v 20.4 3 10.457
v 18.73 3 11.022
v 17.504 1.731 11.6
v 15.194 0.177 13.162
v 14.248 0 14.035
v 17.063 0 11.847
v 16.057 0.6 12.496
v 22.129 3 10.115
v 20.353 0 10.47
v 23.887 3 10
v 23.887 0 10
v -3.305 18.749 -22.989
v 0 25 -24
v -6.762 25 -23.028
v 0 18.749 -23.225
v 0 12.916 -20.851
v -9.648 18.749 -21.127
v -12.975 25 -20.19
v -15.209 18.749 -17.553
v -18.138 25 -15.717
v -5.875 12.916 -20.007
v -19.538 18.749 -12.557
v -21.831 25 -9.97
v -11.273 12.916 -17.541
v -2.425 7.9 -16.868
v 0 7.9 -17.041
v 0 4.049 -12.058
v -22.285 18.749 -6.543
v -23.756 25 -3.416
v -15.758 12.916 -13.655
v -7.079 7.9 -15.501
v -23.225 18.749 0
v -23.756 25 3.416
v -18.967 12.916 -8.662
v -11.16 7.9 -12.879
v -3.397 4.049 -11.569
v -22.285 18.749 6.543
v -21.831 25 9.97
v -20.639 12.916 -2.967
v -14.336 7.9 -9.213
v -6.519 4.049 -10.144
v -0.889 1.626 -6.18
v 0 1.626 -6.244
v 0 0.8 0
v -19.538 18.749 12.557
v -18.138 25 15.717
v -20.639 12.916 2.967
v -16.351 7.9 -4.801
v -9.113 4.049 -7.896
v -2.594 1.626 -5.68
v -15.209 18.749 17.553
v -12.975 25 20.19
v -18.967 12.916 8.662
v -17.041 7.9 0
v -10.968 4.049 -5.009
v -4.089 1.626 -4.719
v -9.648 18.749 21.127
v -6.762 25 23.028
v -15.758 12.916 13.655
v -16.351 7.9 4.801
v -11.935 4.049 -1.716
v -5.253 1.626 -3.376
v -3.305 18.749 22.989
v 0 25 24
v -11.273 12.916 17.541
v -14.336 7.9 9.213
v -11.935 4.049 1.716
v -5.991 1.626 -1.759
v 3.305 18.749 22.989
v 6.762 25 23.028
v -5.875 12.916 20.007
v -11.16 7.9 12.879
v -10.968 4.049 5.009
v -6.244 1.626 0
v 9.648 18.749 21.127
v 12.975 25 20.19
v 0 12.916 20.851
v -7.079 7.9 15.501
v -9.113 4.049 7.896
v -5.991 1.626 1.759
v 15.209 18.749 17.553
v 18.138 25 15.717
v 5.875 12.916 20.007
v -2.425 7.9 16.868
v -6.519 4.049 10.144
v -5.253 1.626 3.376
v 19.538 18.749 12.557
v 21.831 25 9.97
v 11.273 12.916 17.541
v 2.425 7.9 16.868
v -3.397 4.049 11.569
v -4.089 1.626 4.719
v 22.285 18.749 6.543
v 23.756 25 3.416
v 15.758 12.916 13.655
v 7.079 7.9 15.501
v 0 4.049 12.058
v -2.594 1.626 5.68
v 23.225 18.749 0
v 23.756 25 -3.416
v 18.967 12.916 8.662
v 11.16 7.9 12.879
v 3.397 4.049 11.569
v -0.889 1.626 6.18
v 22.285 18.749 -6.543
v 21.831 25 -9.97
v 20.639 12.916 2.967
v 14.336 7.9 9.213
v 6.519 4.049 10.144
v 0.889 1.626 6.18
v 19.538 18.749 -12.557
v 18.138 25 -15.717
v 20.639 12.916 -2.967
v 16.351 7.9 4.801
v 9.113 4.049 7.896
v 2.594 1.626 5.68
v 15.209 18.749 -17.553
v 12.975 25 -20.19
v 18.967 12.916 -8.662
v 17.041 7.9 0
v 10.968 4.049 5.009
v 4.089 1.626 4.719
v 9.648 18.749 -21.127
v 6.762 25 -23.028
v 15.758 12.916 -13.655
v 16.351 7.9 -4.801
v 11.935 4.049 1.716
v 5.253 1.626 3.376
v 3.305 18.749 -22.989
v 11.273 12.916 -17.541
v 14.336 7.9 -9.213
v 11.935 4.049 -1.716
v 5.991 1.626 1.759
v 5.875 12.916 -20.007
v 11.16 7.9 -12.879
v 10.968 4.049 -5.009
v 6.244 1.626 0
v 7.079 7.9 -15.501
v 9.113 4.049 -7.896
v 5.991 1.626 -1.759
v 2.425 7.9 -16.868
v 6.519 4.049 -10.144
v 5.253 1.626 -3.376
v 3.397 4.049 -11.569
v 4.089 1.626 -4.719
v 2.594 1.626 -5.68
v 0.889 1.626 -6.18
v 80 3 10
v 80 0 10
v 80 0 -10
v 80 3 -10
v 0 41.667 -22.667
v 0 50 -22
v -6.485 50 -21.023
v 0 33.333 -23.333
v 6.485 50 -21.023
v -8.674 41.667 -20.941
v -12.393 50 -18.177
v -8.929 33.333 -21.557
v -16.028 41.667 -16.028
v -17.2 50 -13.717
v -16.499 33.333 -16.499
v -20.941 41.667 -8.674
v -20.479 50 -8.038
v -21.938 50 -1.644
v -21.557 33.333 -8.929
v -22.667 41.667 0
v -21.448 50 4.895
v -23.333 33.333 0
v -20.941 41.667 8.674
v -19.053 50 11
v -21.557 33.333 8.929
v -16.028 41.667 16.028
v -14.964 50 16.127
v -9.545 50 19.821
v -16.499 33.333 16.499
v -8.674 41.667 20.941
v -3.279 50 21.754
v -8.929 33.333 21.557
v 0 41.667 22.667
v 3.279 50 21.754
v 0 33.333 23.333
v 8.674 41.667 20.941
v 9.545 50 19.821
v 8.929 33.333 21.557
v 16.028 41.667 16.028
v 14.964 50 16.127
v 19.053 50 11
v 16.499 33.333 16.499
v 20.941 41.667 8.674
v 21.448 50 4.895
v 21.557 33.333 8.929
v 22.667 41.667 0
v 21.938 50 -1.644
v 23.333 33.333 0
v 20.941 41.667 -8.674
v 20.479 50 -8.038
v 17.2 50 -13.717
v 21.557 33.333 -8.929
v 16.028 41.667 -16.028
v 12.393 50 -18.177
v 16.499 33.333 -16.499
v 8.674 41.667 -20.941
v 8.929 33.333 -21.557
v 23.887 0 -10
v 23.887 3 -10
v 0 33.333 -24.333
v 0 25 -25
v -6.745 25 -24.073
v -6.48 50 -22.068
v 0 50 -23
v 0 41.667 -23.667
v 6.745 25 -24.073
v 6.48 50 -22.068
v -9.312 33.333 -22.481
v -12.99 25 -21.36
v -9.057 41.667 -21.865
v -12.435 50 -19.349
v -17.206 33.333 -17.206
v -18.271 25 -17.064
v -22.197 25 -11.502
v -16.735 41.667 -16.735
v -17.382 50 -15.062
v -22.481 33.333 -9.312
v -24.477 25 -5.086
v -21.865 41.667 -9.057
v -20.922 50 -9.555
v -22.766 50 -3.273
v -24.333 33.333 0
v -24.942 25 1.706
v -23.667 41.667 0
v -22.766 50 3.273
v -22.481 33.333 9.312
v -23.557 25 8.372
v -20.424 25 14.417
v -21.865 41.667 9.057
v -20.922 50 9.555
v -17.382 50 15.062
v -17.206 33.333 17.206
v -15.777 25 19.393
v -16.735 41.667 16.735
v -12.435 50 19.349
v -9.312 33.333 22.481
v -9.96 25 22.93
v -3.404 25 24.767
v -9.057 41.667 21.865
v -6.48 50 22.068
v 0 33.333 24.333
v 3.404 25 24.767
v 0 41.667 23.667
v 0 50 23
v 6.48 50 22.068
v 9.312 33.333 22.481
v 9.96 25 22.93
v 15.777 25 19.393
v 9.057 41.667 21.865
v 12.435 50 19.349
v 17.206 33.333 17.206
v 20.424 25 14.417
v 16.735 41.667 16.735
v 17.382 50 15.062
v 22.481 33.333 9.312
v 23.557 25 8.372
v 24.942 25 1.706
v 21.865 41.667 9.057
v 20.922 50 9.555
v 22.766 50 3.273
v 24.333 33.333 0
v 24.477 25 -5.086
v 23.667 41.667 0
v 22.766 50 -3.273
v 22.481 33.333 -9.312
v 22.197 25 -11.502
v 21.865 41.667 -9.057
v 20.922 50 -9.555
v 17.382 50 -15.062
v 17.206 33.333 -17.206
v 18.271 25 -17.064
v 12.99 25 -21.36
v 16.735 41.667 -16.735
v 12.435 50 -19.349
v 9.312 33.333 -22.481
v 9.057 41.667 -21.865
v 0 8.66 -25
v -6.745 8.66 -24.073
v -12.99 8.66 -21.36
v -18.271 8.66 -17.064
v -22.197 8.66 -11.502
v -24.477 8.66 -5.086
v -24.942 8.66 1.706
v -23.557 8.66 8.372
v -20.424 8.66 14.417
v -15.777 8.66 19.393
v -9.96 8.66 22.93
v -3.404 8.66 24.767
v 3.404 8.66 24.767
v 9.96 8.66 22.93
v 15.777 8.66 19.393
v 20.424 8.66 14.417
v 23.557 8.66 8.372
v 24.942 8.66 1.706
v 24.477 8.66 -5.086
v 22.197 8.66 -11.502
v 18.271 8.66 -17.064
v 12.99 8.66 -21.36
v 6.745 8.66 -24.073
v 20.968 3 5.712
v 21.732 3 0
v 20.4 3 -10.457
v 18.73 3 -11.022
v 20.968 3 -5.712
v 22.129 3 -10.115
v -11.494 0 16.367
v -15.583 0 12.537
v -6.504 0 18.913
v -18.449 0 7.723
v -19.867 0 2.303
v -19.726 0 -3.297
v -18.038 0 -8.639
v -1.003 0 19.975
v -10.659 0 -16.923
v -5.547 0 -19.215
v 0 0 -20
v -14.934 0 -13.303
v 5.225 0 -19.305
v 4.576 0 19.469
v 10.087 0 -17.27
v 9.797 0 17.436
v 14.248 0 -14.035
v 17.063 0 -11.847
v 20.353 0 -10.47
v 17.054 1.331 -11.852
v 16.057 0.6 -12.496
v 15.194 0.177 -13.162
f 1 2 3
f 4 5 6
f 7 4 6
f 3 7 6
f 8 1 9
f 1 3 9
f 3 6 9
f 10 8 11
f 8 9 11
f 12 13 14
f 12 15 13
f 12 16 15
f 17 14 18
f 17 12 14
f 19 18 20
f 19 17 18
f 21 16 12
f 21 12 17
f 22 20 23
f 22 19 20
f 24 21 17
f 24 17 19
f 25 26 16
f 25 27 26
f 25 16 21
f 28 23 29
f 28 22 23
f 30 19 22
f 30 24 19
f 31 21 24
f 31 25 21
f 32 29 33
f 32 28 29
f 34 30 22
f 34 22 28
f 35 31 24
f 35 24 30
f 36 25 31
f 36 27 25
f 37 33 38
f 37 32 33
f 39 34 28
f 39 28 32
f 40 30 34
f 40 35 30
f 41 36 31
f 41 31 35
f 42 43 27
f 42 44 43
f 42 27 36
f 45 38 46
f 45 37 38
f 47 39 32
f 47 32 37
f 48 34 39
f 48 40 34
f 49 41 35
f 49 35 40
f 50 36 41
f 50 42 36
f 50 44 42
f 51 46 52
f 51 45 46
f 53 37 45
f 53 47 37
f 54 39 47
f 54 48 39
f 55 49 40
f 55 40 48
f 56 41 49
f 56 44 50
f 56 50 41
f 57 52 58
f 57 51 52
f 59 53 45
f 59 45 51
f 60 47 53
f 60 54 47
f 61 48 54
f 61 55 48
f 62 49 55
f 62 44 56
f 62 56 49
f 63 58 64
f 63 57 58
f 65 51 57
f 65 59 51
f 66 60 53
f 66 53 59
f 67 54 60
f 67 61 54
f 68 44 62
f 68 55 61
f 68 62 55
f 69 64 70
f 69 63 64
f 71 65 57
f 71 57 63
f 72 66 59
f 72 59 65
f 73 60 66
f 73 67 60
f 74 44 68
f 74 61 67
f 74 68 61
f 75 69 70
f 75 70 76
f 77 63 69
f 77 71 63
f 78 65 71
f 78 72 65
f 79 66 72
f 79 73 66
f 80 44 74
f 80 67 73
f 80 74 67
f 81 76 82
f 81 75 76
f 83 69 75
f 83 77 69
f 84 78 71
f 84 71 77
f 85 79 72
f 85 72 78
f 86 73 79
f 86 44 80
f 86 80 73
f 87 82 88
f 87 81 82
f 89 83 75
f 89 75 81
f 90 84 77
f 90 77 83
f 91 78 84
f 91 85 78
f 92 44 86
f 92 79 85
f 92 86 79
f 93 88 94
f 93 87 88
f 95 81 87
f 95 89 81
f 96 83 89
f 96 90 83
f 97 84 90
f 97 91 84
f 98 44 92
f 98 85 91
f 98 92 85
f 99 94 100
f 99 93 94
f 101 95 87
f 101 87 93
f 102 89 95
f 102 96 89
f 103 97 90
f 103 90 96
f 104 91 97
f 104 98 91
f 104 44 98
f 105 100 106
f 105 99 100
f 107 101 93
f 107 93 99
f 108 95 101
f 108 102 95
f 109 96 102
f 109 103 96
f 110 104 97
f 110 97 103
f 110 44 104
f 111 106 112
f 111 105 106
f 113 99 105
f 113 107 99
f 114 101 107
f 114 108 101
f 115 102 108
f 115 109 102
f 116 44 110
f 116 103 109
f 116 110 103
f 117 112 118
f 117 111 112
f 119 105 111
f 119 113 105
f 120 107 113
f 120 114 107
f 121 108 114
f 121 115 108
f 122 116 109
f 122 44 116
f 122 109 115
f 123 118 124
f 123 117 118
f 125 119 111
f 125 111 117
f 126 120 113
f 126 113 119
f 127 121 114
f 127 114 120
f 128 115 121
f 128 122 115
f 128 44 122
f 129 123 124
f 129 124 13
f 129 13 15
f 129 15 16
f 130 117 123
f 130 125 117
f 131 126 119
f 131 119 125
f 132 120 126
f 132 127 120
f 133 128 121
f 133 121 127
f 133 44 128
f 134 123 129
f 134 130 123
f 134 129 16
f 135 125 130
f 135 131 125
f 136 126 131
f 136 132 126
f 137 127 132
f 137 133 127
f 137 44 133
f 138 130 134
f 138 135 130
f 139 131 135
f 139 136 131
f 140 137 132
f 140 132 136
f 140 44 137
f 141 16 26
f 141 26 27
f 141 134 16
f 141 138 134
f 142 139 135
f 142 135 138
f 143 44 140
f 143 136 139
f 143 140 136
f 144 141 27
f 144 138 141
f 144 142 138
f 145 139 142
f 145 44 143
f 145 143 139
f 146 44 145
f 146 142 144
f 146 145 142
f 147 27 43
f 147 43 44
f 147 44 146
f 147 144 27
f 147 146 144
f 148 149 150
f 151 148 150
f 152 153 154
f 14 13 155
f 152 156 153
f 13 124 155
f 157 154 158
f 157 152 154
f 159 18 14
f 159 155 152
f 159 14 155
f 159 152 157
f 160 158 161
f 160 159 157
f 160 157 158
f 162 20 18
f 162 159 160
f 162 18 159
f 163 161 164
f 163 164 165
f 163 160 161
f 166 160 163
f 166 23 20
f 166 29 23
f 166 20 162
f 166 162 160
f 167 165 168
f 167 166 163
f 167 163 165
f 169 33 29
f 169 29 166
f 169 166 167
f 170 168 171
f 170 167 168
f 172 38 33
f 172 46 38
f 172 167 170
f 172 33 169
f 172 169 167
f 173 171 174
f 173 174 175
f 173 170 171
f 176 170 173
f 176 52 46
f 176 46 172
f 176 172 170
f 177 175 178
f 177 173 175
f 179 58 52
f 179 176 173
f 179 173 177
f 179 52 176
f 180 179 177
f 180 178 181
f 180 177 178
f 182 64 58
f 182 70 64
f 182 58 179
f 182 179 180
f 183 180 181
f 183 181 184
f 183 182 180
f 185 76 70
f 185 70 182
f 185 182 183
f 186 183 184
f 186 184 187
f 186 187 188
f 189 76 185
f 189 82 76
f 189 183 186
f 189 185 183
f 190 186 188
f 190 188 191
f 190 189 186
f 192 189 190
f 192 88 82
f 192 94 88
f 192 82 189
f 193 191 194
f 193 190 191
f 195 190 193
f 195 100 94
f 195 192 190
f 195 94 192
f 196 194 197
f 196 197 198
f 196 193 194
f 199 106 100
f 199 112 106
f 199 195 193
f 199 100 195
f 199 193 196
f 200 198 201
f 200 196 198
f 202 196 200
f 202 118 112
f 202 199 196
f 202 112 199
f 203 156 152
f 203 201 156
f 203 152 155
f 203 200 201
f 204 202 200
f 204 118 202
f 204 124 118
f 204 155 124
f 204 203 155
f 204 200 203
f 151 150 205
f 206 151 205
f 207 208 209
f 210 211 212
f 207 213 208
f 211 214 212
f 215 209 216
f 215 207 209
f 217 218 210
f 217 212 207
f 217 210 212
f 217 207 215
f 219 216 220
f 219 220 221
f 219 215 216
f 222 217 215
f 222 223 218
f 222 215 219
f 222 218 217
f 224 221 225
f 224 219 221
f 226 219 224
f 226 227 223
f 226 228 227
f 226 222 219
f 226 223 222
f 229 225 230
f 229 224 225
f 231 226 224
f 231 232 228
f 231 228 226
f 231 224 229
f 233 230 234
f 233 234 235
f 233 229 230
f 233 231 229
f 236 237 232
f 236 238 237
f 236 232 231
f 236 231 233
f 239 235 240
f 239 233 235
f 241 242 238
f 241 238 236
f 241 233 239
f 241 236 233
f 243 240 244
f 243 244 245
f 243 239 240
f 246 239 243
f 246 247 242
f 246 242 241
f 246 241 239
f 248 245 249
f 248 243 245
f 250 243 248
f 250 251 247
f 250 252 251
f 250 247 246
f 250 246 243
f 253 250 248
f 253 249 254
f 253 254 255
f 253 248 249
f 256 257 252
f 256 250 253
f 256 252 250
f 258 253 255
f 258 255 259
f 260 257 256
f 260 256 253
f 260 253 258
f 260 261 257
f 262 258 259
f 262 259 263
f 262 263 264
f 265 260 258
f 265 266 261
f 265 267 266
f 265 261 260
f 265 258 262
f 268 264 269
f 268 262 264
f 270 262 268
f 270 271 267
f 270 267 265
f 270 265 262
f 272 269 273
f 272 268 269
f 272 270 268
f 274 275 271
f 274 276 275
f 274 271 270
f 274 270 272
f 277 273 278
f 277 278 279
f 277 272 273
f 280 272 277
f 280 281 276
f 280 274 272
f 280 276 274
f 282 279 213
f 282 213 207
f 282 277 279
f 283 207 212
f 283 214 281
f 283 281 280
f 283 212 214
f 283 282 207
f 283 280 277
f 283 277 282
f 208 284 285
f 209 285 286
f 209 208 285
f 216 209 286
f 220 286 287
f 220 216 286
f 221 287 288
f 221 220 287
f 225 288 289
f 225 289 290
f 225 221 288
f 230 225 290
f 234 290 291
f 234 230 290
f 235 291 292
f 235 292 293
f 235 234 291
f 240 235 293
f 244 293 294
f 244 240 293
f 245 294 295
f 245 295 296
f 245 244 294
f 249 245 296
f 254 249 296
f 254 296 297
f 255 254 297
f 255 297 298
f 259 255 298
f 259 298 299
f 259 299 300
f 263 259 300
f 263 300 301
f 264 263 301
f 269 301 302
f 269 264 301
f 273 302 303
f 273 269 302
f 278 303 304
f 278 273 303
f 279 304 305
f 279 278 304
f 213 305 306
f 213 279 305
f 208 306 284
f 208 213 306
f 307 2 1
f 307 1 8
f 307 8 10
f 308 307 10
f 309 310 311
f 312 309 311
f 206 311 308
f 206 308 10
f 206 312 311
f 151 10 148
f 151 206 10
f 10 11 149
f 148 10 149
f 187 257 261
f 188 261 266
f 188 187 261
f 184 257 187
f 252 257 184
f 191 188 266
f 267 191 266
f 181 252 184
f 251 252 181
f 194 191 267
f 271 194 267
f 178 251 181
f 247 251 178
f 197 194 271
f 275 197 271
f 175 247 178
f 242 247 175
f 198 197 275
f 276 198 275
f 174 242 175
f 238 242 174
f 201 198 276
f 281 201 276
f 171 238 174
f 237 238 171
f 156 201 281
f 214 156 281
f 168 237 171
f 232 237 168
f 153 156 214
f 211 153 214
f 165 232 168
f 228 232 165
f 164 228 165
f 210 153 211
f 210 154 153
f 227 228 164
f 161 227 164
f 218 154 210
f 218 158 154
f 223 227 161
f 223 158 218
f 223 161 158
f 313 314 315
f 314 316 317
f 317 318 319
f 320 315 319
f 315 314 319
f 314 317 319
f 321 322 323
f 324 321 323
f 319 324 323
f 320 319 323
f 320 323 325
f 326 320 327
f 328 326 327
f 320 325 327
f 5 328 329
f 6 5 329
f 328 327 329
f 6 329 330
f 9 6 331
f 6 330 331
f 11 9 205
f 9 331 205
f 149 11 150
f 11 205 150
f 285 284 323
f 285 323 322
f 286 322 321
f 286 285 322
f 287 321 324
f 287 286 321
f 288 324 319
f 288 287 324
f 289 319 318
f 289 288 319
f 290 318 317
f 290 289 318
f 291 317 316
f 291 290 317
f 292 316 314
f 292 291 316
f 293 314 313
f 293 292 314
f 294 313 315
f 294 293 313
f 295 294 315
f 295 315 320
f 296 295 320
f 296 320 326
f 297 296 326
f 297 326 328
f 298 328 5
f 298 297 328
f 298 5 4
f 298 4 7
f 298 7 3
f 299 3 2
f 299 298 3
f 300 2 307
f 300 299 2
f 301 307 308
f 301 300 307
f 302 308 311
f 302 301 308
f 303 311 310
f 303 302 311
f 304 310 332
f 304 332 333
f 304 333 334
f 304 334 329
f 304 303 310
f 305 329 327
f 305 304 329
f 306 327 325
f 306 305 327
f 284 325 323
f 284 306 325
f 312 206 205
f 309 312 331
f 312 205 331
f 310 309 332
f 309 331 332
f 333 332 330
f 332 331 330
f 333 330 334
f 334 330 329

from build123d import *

# Parameters (mm, degrees)
BOSS_EXTRUDE2_DEPTH = 3


with BuildPart() as part:
    # Sketch6 → Revolve1 (revolve)
    with BuildSketch(Plane(origin=(0, 0, 0), x_dir=(0, 0, -1), z_dir=(1, 0, 0)), mode=Mode.PRIVATE) as revolve1_sk:
        with BuildLine():
            Line((0, 0), (-20, 0))
            Line((-20, 0), (-25, 8.660254038))
            Line((-25, 8.660254038), (-25, 25))
            Line((-25, 25), (-23, 50))
            Line((-23, 50), (-22, 50))
            Line((-22, 50), (-24, 25))
            ThreePointArc((-24, 25), (-17.041420129, 7.900244501), (0, 0.8))
            Line((0, 0.8), (0, 0))
        make_face()
    revolve(revolve1_sk.sketch.rotate(Axis((0, 0.628504357, 0), (0, 1, 0)), 180), axis=Axis((0, 0.628504357, 0), (0, 1, 0)))

    # Sketch7 → Boss-Extrude2 (add)
    with BuildSketch(Plane(origin=(0, 0, 0), x_dir=(1, 0, 0), z_dir=(0, 1, 0))):
        with BuildLine():
            Line((23.887428117, -10), (80, -10))
            Line((80, -10), (80, 10))
            Line((80, 10), (23.887428117, 10))
            ThreePointArc((23.887428117, 10), (18.662529879, 11.049522995), (14.248195421, 14.035274392))
            ThreePointArc((14.248195421, 14.035274392), (20, 0), (14.248195421, -14.035274392))
            ThreePointArc((14.248195421, -14.035274392), (18.662529879, -11.049522995), (23.887428117, -10))
        make_face()
    extrude(amount=BOSS_EXTRUDE2_DEPTH)


solid = part.part
